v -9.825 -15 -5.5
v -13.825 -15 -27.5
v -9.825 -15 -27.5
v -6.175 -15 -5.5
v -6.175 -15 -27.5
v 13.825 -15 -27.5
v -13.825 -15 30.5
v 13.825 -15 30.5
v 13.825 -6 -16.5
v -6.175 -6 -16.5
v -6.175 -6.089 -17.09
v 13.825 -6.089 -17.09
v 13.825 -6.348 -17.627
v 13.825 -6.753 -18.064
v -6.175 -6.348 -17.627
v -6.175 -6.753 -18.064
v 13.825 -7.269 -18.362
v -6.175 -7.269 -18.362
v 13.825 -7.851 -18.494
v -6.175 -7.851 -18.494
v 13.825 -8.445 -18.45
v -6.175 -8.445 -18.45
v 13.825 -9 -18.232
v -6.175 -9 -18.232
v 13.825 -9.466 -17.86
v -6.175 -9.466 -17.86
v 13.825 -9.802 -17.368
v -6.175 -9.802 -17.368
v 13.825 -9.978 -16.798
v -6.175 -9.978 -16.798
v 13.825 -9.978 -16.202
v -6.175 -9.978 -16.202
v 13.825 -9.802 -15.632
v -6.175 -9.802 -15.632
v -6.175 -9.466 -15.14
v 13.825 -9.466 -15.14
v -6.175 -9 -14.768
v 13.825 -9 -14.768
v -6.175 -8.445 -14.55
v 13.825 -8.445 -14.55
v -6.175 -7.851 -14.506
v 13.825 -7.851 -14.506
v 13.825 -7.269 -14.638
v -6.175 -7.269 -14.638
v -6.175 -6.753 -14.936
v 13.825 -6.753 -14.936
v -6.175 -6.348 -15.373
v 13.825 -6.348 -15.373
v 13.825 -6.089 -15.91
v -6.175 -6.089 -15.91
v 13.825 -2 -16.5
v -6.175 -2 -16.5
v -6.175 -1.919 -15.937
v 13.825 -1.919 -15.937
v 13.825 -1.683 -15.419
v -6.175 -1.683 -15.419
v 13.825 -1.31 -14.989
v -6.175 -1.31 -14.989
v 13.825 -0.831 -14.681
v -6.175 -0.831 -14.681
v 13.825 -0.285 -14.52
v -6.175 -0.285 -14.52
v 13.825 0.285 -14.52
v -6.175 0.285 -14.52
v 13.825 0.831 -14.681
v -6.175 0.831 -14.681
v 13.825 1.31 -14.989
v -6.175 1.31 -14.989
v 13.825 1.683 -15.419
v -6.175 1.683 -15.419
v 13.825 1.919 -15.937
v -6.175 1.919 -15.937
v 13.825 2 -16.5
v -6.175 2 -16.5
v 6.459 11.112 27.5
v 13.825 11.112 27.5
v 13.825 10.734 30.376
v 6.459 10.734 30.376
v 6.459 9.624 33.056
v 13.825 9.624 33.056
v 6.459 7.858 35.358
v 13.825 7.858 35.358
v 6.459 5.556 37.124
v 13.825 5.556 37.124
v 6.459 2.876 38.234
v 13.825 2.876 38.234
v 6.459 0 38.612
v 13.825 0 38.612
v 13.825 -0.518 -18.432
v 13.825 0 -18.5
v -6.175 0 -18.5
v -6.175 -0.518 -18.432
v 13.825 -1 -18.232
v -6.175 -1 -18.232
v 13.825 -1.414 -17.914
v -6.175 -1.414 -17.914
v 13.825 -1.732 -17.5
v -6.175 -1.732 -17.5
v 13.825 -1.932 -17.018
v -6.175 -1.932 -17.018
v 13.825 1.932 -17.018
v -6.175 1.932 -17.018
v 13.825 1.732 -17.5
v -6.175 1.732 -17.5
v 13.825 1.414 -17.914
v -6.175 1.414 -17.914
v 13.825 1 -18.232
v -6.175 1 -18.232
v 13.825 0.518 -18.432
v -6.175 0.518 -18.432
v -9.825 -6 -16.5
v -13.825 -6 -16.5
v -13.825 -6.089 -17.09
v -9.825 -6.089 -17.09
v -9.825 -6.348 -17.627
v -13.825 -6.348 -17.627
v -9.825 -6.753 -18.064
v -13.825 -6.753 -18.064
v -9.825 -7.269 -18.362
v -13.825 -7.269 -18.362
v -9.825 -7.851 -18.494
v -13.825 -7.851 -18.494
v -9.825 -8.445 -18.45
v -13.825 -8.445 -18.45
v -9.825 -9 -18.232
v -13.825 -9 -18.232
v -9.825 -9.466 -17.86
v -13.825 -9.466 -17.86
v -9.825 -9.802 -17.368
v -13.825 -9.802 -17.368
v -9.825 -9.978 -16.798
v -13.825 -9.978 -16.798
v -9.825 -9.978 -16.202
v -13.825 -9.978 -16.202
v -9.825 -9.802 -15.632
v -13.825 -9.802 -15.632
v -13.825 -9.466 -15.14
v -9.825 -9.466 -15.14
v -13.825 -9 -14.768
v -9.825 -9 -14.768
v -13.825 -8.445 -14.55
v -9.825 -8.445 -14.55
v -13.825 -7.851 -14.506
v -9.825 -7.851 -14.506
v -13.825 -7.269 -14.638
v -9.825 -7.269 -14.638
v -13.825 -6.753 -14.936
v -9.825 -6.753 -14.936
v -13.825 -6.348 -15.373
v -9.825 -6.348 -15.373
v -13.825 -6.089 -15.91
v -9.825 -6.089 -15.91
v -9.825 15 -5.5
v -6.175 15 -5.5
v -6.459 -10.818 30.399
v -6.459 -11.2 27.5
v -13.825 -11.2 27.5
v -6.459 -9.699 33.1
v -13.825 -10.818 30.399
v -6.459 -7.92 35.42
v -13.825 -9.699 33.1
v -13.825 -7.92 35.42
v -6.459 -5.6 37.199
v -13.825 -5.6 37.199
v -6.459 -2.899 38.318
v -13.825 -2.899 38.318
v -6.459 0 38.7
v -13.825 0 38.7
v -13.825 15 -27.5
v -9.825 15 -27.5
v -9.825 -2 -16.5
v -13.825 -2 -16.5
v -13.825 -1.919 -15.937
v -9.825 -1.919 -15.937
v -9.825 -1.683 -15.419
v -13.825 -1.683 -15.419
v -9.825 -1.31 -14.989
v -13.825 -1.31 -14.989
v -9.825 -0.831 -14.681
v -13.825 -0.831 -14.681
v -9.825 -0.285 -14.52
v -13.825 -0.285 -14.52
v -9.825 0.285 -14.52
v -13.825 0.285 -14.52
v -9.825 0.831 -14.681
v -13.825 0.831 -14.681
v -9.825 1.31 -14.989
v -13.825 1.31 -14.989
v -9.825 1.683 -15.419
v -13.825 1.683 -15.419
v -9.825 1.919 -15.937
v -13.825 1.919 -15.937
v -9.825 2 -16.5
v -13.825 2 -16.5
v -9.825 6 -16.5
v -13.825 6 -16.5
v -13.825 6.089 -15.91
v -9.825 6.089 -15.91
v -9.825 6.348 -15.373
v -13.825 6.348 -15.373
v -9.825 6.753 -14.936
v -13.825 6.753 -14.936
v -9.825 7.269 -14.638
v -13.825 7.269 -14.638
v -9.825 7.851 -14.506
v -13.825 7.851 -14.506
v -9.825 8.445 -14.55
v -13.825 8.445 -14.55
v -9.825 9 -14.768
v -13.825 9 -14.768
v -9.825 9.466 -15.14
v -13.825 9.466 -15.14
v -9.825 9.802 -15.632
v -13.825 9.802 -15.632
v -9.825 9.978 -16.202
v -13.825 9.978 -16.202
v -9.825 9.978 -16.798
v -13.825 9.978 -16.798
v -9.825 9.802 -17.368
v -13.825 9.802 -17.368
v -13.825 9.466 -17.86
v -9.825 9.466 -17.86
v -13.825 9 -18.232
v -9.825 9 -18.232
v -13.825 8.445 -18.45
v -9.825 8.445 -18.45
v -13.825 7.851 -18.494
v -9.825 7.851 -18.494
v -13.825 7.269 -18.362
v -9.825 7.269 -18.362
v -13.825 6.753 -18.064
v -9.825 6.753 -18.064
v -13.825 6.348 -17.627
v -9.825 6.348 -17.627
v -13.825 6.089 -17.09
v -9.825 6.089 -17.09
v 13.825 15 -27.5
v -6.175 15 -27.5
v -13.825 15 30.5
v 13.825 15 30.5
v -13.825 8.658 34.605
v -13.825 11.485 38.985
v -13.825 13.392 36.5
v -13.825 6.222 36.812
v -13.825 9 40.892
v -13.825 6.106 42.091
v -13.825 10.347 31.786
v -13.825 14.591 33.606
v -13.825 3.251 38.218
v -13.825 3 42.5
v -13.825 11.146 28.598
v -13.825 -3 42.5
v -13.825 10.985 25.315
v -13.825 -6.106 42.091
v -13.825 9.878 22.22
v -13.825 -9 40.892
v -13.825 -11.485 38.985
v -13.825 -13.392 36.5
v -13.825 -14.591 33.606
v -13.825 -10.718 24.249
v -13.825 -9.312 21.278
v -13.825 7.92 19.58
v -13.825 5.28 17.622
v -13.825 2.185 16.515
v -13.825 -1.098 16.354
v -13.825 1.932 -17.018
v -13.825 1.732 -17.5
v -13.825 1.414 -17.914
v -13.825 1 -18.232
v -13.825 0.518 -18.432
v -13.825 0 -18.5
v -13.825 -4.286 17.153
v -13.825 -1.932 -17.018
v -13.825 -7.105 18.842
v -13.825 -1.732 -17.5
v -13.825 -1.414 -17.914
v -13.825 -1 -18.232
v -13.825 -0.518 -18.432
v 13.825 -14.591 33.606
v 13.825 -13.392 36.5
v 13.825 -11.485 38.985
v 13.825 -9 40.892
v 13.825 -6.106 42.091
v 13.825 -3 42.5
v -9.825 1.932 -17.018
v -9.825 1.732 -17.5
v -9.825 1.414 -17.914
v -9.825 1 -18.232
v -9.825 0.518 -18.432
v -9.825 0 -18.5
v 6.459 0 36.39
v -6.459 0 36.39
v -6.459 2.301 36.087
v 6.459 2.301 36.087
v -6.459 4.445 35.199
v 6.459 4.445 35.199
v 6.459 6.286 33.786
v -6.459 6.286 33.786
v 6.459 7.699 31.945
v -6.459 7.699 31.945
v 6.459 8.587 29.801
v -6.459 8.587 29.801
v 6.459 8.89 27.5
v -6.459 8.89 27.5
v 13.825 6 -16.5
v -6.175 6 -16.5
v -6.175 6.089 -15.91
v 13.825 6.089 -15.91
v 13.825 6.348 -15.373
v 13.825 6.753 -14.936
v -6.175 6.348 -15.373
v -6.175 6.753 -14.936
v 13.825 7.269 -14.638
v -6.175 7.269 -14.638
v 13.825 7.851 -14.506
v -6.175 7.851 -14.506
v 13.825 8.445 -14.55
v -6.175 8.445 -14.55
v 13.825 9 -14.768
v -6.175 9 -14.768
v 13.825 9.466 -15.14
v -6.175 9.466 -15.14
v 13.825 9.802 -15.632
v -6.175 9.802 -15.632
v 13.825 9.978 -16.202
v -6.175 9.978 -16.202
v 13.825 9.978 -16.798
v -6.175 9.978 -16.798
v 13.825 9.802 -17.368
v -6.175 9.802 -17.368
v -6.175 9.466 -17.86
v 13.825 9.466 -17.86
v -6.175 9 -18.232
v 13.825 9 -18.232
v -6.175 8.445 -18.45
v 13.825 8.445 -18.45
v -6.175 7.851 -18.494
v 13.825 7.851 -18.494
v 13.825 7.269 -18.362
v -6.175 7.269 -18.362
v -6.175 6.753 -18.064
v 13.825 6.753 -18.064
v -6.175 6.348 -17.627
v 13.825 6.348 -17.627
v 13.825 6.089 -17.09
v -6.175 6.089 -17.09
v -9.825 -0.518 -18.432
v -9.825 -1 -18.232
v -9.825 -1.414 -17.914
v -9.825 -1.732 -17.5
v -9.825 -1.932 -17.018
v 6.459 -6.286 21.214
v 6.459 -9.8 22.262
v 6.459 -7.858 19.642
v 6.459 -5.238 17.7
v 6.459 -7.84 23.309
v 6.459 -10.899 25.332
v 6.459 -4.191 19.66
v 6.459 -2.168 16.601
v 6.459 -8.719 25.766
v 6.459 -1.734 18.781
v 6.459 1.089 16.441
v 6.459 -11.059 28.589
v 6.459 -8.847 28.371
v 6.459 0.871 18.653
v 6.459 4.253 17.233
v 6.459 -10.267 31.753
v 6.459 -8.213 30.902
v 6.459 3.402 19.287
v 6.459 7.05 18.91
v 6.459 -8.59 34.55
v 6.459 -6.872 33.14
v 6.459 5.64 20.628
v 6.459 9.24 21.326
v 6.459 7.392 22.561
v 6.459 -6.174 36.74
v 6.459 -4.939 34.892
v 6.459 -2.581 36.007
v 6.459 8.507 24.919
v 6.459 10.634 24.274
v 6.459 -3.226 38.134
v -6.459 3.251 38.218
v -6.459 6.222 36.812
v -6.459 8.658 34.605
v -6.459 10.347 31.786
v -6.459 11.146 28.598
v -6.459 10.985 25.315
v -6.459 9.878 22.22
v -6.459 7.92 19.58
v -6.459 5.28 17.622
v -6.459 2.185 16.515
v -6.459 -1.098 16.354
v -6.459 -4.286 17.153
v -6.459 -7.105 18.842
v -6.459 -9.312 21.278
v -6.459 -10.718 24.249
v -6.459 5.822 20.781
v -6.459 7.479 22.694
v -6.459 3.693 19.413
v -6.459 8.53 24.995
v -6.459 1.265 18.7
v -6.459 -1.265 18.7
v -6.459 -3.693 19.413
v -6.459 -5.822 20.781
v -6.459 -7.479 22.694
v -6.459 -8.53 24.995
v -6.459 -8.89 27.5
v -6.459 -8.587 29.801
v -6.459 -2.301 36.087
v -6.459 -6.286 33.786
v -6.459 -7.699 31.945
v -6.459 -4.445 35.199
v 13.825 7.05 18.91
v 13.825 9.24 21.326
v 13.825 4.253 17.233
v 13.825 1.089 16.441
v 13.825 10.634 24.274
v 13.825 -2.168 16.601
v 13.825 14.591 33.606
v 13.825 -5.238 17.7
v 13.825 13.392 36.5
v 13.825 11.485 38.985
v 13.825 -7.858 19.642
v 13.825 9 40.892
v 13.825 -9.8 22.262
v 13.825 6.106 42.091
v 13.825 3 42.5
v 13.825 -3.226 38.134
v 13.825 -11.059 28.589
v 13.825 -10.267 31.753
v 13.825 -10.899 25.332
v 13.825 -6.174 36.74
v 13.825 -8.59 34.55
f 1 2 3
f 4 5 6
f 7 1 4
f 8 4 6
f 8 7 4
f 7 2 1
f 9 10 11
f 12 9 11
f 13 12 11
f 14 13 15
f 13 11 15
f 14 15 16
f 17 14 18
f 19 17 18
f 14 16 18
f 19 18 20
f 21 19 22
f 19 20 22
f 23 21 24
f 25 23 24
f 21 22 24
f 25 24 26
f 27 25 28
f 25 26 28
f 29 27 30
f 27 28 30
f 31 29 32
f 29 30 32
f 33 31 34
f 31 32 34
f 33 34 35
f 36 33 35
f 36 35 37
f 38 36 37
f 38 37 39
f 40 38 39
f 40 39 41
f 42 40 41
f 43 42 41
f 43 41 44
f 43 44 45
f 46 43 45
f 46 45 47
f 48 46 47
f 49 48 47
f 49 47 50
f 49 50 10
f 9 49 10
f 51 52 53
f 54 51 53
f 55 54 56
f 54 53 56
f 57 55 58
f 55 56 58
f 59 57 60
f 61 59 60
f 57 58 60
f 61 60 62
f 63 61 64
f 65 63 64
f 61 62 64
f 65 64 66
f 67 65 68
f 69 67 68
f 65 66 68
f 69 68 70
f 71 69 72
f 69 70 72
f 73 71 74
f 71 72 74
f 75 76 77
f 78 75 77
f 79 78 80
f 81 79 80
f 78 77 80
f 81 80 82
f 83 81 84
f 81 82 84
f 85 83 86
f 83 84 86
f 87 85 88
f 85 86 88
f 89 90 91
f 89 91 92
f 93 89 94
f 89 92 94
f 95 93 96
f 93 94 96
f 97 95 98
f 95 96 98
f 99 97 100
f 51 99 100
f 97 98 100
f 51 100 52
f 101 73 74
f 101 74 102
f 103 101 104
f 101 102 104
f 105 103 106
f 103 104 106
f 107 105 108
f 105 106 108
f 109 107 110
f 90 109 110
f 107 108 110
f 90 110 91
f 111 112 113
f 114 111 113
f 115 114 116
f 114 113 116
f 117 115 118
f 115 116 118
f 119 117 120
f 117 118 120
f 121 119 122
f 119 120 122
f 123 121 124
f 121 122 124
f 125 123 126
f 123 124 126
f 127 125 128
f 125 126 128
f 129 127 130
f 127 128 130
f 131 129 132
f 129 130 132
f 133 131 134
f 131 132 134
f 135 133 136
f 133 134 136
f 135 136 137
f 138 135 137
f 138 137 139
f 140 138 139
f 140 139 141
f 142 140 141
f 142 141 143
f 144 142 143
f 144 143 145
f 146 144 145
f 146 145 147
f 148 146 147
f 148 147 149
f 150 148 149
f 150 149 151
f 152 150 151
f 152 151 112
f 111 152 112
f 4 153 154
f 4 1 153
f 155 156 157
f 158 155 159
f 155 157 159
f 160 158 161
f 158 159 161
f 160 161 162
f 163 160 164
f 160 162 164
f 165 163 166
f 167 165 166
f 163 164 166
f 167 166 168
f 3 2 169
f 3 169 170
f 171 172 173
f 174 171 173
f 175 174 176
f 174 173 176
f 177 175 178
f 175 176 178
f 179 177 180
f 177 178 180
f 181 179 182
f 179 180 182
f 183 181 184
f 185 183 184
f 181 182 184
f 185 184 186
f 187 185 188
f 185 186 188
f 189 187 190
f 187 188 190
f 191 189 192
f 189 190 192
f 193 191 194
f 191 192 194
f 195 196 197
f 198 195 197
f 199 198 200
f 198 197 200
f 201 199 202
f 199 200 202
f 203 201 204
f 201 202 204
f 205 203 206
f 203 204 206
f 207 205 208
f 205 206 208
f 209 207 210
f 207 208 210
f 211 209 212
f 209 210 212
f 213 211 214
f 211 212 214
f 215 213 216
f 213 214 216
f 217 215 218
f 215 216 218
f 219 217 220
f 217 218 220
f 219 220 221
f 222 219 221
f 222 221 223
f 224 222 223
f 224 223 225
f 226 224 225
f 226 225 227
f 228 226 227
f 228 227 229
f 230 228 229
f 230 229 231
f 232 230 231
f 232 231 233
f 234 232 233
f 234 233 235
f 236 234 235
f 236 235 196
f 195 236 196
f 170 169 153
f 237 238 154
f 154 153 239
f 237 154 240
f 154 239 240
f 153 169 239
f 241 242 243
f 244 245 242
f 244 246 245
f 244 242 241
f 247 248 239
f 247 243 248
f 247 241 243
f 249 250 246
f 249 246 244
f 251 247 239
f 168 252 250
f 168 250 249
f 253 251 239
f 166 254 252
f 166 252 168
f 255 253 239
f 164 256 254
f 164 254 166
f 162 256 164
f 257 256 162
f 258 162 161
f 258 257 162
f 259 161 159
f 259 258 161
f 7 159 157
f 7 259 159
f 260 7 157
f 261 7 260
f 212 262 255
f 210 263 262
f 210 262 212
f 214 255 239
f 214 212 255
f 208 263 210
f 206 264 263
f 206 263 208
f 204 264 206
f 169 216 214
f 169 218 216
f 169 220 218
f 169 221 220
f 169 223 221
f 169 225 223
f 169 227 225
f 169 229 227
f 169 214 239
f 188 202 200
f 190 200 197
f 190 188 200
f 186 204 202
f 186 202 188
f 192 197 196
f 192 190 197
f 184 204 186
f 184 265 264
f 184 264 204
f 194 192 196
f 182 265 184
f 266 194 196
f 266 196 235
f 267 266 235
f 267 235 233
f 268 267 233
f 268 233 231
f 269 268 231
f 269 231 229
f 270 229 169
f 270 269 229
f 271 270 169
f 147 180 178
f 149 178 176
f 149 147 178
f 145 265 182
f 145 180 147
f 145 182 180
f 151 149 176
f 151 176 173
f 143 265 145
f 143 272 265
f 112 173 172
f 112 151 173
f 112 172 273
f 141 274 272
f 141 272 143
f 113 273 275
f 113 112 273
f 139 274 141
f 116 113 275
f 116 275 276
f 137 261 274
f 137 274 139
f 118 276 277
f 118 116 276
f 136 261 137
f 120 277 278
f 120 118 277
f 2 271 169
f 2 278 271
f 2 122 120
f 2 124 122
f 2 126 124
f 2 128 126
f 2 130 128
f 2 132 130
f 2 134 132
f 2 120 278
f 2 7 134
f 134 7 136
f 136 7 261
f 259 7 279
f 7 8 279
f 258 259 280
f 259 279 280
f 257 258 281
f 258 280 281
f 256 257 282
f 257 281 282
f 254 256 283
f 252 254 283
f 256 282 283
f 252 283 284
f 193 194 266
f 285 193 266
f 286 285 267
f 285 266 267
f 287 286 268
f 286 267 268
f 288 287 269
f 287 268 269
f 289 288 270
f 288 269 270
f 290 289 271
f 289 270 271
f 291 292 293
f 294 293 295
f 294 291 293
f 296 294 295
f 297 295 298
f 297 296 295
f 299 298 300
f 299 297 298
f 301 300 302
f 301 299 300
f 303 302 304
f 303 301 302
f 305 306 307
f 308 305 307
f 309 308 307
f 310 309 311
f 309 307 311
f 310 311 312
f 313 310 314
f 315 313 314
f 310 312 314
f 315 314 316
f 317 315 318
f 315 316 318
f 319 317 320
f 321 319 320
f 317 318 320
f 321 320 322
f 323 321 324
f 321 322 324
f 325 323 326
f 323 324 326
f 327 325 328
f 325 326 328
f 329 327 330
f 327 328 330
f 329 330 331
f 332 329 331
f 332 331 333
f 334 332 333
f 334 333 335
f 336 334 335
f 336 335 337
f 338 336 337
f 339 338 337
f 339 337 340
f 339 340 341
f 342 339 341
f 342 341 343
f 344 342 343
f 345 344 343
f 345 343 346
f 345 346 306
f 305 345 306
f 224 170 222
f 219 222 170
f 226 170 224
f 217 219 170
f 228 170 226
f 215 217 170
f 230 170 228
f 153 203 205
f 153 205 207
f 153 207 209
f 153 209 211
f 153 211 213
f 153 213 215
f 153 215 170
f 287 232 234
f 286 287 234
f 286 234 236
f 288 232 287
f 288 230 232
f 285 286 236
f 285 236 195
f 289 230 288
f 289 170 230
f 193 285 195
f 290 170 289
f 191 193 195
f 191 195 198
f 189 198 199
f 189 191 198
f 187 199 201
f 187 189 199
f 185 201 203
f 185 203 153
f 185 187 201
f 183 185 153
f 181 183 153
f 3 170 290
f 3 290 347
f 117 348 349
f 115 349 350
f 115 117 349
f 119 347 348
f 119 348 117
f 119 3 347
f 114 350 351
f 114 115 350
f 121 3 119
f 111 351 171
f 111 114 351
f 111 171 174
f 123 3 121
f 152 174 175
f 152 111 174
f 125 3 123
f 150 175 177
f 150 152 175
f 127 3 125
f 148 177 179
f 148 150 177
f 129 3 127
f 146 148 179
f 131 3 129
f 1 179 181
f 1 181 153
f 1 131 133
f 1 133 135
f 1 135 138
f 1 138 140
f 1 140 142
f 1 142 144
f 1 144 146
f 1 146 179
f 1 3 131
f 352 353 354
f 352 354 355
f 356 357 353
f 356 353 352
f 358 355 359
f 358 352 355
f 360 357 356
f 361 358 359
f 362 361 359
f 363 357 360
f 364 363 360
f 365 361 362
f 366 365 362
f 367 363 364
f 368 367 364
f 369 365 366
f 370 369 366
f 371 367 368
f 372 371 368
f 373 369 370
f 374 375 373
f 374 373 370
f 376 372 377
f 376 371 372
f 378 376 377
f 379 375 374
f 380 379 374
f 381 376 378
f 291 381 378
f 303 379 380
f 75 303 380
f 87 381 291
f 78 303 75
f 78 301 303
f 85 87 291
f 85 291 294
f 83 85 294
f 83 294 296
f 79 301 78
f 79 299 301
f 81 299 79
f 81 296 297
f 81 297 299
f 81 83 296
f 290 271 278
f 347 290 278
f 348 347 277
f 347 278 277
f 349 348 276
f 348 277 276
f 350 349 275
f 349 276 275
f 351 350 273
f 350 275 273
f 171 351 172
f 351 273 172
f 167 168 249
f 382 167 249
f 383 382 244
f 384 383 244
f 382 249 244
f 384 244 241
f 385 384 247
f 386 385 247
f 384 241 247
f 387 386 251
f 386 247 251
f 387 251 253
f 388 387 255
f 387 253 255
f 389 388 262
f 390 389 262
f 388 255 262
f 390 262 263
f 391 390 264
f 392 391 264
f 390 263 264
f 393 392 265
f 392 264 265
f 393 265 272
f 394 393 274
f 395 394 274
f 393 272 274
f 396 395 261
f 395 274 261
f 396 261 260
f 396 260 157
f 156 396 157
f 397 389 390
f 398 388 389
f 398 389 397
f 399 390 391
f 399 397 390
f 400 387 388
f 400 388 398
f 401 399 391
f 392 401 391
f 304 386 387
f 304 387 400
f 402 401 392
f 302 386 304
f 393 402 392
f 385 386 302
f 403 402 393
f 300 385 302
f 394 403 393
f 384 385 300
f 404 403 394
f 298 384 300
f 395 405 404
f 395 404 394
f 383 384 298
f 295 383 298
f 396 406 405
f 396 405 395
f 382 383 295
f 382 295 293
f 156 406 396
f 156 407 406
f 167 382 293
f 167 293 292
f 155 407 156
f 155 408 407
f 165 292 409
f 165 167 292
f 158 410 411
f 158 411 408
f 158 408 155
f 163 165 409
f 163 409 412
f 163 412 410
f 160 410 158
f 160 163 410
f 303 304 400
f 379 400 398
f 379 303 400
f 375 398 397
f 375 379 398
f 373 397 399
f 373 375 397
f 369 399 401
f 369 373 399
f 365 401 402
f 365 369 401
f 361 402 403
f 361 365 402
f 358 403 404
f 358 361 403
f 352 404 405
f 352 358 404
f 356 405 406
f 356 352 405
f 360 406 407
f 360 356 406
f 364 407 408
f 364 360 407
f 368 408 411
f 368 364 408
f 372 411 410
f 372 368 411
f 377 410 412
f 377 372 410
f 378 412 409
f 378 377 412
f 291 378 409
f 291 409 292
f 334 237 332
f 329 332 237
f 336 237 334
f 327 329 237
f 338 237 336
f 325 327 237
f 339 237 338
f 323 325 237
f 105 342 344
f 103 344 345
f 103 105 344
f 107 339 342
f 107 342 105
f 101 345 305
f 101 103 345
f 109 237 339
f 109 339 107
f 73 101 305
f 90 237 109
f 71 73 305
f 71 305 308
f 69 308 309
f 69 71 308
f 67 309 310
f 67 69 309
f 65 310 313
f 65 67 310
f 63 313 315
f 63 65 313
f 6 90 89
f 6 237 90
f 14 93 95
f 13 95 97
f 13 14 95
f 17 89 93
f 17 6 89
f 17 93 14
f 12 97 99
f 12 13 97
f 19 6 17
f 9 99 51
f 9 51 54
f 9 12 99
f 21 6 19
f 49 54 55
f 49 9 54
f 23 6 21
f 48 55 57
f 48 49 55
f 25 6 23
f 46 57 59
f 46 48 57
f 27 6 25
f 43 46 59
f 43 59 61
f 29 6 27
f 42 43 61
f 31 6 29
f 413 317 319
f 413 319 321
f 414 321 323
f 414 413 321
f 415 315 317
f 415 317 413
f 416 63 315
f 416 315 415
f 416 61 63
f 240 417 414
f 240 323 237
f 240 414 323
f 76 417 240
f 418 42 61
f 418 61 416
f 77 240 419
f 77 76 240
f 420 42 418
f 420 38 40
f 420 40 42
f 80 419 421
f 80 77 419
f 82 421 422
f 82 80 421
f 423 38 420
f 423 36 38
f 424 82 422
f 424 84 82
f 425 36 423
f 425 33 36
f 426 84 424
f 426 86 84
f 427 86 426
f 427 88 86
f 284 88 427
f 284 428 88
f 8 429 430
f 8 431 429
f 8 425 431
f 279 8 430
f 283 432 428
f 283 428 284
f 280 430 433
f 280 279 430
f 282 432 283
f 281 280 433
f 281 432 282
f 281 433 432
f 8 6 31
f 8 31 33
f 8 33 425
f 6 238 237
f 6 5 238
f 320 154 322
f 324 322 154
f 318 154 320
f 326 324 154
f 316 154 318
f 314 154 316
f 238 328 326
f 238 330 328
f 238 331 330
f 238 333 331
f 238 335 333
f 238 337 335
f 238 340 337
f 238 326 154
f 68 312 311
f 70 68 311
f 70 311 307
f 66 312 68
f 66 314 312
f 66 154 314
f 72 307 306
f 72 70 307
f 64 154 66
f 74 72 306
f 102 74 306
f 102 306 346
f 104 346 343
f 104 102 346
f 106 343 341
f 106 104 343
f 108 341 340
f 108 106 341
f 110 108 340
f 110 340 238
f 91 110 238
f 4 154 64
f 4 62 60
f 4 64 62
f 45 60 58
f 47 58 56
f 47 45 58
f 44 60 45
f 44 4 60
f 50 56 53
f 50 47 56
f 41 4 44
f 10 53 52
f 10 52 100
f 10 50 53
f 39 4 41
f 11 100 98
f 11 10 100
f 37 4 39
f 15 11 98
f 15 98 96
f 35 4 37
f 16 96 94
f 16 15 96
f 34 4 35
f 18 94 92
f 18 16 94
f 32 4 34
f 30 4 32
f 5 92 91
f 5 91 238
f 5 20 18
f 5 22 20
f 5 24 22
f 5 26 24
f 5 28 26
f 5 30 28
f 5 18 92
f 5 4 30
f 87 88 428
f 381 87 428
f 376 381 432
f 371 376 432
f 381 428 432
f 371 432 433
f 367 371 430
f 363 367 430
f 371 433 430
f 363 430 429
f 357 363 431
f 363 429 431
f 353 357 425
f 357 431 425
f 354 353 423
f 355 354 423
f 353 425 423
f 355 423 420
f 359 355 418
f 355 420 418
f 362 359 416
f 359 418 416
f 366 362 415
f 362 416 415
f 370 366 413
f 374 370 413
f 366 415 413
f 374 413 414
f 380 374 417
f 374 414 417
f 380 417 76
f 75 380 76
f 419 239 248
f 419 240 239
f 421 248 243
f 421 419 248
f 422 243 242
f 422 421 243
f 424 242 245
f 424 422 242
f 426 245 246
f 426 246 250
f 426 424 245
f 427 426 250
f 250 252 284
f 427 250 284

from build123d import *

# Parameters (mm, degrees)
F0_W     = 27.65
F0_H     = 15
F1_DEPTH = 15
F3_DEPTH = 7.366
F4_DEPTH = 40
F6_DEPTH = 7.366
F7_R     = 12
F8_R     = 2
F9_DEPTH = 30


with BuildPart() as f1:
    # F0 (on Front) → F1 (new body, symmetric)
    with BuildSketch(Plane.XZ):
        Polygon((-6.175, -27.5), (13.825, -27.5), (13.825, 27.5), (-13.825, 27.5), (-13.825, -5.5), (-13.825, -27.5), (-9.825, -27.5), (-9.825, -5.5), (-6.175, -5.5), align=None)
        with Locations((0, 35)):
            Rectangle(F0_W, F0_H)
    extrude(amount=F1_DEPTH, both=True)

    # F2 (on face) → F3 (cut)
    with BuildSketch(Plane.YZ.offset(13.825)):
        with BuildLine():
            ThreePointArc((11.1125, 27.5), (7.8577241059, 35.3577241059), (0, 38.6125))
            ThreePointArc((0, 38.6125), (-7.8577241059, 19.6422758941), (11.1125, 27.5))
        make_face()
        with BuildLine():
            ThreePointArc((8.89, 27.5), (-6.2861792847, 21.2138207153), (0, 36.39))
            ThreePointArc((0, 36.39), (6.2861792847, 33.7861792847), (8.89, 27.5))
        make_face(mode=Mode.SUBTRACT)
    extrude(amount=-F3_DEPTH, mode=Mode.SUBTRACT)

    # F4 (cut): a face of the model
    f4_faces = [f1.faces().sort_by_distance(p)[0] for p in [
        (13.825, 0, 27.5),
    ]]
    extrude(f4_faces, amount=-F4_DEPTH, mode=Mode.SUBTRACT)

    # F5 (on face) → F6 (cut)
    with BuildSketch(Plane(origin=(-13.825, 0, 0), x_dir=(0, -1, 0), z_dir=(-1, 0, 0))):
        with BuildLine():
            ThreePointArc((11.2, 27.5), (7.9195959493, 35.4195959493), (0, 38.7))
            ThreePointArc((0, 38.7), (-7.9195959493, 19.5804040507), (11.2, 27.5))
        make_face()
        with BuildLine():
            ThreePointArc((8.89, 27.5), (-6.2861792847, 21.2138207153), (0, 36.39))
            ThreePointArc((0, 36.39), (6.2861792847, 33.7861792847), (8.89, 27.5))
        make_face(mode=Mode.SUBTRACT)
    extrude(amount=-F6_DEPTH, mode=Mode.SUBTRACT)

    # F7
    f7_edges = [f1.edges().sort_by_distance(p)[0] for p in [
        (0, 15, 42.5),
        (0, -15, 42.5),
    ]]
    fillet(f7_edges, radius=F7_R)

    # F8 (on face) → F9 (cut)
    with BuildSketch(Plane(origin=(-13.825, 0, 0), x_dir=(0, -1, 0), z_dir=(-1, 0, 0))):
        with BuildLine():
            Line((-2, -16.5), (0, -16.5))
            Line((0, -16.5), (2, -16.5))
            ThreePointArc((2, -16.5), (0, -14.5), (-2, -16.5))
        make_face()
        with BuildLine():
            ThreePointArc((-2, -16.5), (-1.4142135624, -17.9142135624), (0, -18.5))
            Line((0, -18.5), (0, -16.5))
            Line((0, -16.5), (-2, -16.5))
        make_face()
        with BuildLine():
            Line((0, -16.5), (0, -18.5))
            ThreePointArc((0, -18.5), (1.4142135624, -17.9142135624), (2, -16.5))
            Line((2, -16.5), (0, -16.5))
        make_face()
        with Locations((-8, -16.5)):
            Circle(F8_R)
        with BuildLine():
            ThreePointArc((10, -16.5), (8, -14.5), (6, -16.5))
            ThreePointArc((6, -16.5), (8, -18.5), (10, -16.5))
        make_face()
    extrude(amount=-F9_DEPTH, mode=Mode.SUBTRACT)


solid = f1.part
